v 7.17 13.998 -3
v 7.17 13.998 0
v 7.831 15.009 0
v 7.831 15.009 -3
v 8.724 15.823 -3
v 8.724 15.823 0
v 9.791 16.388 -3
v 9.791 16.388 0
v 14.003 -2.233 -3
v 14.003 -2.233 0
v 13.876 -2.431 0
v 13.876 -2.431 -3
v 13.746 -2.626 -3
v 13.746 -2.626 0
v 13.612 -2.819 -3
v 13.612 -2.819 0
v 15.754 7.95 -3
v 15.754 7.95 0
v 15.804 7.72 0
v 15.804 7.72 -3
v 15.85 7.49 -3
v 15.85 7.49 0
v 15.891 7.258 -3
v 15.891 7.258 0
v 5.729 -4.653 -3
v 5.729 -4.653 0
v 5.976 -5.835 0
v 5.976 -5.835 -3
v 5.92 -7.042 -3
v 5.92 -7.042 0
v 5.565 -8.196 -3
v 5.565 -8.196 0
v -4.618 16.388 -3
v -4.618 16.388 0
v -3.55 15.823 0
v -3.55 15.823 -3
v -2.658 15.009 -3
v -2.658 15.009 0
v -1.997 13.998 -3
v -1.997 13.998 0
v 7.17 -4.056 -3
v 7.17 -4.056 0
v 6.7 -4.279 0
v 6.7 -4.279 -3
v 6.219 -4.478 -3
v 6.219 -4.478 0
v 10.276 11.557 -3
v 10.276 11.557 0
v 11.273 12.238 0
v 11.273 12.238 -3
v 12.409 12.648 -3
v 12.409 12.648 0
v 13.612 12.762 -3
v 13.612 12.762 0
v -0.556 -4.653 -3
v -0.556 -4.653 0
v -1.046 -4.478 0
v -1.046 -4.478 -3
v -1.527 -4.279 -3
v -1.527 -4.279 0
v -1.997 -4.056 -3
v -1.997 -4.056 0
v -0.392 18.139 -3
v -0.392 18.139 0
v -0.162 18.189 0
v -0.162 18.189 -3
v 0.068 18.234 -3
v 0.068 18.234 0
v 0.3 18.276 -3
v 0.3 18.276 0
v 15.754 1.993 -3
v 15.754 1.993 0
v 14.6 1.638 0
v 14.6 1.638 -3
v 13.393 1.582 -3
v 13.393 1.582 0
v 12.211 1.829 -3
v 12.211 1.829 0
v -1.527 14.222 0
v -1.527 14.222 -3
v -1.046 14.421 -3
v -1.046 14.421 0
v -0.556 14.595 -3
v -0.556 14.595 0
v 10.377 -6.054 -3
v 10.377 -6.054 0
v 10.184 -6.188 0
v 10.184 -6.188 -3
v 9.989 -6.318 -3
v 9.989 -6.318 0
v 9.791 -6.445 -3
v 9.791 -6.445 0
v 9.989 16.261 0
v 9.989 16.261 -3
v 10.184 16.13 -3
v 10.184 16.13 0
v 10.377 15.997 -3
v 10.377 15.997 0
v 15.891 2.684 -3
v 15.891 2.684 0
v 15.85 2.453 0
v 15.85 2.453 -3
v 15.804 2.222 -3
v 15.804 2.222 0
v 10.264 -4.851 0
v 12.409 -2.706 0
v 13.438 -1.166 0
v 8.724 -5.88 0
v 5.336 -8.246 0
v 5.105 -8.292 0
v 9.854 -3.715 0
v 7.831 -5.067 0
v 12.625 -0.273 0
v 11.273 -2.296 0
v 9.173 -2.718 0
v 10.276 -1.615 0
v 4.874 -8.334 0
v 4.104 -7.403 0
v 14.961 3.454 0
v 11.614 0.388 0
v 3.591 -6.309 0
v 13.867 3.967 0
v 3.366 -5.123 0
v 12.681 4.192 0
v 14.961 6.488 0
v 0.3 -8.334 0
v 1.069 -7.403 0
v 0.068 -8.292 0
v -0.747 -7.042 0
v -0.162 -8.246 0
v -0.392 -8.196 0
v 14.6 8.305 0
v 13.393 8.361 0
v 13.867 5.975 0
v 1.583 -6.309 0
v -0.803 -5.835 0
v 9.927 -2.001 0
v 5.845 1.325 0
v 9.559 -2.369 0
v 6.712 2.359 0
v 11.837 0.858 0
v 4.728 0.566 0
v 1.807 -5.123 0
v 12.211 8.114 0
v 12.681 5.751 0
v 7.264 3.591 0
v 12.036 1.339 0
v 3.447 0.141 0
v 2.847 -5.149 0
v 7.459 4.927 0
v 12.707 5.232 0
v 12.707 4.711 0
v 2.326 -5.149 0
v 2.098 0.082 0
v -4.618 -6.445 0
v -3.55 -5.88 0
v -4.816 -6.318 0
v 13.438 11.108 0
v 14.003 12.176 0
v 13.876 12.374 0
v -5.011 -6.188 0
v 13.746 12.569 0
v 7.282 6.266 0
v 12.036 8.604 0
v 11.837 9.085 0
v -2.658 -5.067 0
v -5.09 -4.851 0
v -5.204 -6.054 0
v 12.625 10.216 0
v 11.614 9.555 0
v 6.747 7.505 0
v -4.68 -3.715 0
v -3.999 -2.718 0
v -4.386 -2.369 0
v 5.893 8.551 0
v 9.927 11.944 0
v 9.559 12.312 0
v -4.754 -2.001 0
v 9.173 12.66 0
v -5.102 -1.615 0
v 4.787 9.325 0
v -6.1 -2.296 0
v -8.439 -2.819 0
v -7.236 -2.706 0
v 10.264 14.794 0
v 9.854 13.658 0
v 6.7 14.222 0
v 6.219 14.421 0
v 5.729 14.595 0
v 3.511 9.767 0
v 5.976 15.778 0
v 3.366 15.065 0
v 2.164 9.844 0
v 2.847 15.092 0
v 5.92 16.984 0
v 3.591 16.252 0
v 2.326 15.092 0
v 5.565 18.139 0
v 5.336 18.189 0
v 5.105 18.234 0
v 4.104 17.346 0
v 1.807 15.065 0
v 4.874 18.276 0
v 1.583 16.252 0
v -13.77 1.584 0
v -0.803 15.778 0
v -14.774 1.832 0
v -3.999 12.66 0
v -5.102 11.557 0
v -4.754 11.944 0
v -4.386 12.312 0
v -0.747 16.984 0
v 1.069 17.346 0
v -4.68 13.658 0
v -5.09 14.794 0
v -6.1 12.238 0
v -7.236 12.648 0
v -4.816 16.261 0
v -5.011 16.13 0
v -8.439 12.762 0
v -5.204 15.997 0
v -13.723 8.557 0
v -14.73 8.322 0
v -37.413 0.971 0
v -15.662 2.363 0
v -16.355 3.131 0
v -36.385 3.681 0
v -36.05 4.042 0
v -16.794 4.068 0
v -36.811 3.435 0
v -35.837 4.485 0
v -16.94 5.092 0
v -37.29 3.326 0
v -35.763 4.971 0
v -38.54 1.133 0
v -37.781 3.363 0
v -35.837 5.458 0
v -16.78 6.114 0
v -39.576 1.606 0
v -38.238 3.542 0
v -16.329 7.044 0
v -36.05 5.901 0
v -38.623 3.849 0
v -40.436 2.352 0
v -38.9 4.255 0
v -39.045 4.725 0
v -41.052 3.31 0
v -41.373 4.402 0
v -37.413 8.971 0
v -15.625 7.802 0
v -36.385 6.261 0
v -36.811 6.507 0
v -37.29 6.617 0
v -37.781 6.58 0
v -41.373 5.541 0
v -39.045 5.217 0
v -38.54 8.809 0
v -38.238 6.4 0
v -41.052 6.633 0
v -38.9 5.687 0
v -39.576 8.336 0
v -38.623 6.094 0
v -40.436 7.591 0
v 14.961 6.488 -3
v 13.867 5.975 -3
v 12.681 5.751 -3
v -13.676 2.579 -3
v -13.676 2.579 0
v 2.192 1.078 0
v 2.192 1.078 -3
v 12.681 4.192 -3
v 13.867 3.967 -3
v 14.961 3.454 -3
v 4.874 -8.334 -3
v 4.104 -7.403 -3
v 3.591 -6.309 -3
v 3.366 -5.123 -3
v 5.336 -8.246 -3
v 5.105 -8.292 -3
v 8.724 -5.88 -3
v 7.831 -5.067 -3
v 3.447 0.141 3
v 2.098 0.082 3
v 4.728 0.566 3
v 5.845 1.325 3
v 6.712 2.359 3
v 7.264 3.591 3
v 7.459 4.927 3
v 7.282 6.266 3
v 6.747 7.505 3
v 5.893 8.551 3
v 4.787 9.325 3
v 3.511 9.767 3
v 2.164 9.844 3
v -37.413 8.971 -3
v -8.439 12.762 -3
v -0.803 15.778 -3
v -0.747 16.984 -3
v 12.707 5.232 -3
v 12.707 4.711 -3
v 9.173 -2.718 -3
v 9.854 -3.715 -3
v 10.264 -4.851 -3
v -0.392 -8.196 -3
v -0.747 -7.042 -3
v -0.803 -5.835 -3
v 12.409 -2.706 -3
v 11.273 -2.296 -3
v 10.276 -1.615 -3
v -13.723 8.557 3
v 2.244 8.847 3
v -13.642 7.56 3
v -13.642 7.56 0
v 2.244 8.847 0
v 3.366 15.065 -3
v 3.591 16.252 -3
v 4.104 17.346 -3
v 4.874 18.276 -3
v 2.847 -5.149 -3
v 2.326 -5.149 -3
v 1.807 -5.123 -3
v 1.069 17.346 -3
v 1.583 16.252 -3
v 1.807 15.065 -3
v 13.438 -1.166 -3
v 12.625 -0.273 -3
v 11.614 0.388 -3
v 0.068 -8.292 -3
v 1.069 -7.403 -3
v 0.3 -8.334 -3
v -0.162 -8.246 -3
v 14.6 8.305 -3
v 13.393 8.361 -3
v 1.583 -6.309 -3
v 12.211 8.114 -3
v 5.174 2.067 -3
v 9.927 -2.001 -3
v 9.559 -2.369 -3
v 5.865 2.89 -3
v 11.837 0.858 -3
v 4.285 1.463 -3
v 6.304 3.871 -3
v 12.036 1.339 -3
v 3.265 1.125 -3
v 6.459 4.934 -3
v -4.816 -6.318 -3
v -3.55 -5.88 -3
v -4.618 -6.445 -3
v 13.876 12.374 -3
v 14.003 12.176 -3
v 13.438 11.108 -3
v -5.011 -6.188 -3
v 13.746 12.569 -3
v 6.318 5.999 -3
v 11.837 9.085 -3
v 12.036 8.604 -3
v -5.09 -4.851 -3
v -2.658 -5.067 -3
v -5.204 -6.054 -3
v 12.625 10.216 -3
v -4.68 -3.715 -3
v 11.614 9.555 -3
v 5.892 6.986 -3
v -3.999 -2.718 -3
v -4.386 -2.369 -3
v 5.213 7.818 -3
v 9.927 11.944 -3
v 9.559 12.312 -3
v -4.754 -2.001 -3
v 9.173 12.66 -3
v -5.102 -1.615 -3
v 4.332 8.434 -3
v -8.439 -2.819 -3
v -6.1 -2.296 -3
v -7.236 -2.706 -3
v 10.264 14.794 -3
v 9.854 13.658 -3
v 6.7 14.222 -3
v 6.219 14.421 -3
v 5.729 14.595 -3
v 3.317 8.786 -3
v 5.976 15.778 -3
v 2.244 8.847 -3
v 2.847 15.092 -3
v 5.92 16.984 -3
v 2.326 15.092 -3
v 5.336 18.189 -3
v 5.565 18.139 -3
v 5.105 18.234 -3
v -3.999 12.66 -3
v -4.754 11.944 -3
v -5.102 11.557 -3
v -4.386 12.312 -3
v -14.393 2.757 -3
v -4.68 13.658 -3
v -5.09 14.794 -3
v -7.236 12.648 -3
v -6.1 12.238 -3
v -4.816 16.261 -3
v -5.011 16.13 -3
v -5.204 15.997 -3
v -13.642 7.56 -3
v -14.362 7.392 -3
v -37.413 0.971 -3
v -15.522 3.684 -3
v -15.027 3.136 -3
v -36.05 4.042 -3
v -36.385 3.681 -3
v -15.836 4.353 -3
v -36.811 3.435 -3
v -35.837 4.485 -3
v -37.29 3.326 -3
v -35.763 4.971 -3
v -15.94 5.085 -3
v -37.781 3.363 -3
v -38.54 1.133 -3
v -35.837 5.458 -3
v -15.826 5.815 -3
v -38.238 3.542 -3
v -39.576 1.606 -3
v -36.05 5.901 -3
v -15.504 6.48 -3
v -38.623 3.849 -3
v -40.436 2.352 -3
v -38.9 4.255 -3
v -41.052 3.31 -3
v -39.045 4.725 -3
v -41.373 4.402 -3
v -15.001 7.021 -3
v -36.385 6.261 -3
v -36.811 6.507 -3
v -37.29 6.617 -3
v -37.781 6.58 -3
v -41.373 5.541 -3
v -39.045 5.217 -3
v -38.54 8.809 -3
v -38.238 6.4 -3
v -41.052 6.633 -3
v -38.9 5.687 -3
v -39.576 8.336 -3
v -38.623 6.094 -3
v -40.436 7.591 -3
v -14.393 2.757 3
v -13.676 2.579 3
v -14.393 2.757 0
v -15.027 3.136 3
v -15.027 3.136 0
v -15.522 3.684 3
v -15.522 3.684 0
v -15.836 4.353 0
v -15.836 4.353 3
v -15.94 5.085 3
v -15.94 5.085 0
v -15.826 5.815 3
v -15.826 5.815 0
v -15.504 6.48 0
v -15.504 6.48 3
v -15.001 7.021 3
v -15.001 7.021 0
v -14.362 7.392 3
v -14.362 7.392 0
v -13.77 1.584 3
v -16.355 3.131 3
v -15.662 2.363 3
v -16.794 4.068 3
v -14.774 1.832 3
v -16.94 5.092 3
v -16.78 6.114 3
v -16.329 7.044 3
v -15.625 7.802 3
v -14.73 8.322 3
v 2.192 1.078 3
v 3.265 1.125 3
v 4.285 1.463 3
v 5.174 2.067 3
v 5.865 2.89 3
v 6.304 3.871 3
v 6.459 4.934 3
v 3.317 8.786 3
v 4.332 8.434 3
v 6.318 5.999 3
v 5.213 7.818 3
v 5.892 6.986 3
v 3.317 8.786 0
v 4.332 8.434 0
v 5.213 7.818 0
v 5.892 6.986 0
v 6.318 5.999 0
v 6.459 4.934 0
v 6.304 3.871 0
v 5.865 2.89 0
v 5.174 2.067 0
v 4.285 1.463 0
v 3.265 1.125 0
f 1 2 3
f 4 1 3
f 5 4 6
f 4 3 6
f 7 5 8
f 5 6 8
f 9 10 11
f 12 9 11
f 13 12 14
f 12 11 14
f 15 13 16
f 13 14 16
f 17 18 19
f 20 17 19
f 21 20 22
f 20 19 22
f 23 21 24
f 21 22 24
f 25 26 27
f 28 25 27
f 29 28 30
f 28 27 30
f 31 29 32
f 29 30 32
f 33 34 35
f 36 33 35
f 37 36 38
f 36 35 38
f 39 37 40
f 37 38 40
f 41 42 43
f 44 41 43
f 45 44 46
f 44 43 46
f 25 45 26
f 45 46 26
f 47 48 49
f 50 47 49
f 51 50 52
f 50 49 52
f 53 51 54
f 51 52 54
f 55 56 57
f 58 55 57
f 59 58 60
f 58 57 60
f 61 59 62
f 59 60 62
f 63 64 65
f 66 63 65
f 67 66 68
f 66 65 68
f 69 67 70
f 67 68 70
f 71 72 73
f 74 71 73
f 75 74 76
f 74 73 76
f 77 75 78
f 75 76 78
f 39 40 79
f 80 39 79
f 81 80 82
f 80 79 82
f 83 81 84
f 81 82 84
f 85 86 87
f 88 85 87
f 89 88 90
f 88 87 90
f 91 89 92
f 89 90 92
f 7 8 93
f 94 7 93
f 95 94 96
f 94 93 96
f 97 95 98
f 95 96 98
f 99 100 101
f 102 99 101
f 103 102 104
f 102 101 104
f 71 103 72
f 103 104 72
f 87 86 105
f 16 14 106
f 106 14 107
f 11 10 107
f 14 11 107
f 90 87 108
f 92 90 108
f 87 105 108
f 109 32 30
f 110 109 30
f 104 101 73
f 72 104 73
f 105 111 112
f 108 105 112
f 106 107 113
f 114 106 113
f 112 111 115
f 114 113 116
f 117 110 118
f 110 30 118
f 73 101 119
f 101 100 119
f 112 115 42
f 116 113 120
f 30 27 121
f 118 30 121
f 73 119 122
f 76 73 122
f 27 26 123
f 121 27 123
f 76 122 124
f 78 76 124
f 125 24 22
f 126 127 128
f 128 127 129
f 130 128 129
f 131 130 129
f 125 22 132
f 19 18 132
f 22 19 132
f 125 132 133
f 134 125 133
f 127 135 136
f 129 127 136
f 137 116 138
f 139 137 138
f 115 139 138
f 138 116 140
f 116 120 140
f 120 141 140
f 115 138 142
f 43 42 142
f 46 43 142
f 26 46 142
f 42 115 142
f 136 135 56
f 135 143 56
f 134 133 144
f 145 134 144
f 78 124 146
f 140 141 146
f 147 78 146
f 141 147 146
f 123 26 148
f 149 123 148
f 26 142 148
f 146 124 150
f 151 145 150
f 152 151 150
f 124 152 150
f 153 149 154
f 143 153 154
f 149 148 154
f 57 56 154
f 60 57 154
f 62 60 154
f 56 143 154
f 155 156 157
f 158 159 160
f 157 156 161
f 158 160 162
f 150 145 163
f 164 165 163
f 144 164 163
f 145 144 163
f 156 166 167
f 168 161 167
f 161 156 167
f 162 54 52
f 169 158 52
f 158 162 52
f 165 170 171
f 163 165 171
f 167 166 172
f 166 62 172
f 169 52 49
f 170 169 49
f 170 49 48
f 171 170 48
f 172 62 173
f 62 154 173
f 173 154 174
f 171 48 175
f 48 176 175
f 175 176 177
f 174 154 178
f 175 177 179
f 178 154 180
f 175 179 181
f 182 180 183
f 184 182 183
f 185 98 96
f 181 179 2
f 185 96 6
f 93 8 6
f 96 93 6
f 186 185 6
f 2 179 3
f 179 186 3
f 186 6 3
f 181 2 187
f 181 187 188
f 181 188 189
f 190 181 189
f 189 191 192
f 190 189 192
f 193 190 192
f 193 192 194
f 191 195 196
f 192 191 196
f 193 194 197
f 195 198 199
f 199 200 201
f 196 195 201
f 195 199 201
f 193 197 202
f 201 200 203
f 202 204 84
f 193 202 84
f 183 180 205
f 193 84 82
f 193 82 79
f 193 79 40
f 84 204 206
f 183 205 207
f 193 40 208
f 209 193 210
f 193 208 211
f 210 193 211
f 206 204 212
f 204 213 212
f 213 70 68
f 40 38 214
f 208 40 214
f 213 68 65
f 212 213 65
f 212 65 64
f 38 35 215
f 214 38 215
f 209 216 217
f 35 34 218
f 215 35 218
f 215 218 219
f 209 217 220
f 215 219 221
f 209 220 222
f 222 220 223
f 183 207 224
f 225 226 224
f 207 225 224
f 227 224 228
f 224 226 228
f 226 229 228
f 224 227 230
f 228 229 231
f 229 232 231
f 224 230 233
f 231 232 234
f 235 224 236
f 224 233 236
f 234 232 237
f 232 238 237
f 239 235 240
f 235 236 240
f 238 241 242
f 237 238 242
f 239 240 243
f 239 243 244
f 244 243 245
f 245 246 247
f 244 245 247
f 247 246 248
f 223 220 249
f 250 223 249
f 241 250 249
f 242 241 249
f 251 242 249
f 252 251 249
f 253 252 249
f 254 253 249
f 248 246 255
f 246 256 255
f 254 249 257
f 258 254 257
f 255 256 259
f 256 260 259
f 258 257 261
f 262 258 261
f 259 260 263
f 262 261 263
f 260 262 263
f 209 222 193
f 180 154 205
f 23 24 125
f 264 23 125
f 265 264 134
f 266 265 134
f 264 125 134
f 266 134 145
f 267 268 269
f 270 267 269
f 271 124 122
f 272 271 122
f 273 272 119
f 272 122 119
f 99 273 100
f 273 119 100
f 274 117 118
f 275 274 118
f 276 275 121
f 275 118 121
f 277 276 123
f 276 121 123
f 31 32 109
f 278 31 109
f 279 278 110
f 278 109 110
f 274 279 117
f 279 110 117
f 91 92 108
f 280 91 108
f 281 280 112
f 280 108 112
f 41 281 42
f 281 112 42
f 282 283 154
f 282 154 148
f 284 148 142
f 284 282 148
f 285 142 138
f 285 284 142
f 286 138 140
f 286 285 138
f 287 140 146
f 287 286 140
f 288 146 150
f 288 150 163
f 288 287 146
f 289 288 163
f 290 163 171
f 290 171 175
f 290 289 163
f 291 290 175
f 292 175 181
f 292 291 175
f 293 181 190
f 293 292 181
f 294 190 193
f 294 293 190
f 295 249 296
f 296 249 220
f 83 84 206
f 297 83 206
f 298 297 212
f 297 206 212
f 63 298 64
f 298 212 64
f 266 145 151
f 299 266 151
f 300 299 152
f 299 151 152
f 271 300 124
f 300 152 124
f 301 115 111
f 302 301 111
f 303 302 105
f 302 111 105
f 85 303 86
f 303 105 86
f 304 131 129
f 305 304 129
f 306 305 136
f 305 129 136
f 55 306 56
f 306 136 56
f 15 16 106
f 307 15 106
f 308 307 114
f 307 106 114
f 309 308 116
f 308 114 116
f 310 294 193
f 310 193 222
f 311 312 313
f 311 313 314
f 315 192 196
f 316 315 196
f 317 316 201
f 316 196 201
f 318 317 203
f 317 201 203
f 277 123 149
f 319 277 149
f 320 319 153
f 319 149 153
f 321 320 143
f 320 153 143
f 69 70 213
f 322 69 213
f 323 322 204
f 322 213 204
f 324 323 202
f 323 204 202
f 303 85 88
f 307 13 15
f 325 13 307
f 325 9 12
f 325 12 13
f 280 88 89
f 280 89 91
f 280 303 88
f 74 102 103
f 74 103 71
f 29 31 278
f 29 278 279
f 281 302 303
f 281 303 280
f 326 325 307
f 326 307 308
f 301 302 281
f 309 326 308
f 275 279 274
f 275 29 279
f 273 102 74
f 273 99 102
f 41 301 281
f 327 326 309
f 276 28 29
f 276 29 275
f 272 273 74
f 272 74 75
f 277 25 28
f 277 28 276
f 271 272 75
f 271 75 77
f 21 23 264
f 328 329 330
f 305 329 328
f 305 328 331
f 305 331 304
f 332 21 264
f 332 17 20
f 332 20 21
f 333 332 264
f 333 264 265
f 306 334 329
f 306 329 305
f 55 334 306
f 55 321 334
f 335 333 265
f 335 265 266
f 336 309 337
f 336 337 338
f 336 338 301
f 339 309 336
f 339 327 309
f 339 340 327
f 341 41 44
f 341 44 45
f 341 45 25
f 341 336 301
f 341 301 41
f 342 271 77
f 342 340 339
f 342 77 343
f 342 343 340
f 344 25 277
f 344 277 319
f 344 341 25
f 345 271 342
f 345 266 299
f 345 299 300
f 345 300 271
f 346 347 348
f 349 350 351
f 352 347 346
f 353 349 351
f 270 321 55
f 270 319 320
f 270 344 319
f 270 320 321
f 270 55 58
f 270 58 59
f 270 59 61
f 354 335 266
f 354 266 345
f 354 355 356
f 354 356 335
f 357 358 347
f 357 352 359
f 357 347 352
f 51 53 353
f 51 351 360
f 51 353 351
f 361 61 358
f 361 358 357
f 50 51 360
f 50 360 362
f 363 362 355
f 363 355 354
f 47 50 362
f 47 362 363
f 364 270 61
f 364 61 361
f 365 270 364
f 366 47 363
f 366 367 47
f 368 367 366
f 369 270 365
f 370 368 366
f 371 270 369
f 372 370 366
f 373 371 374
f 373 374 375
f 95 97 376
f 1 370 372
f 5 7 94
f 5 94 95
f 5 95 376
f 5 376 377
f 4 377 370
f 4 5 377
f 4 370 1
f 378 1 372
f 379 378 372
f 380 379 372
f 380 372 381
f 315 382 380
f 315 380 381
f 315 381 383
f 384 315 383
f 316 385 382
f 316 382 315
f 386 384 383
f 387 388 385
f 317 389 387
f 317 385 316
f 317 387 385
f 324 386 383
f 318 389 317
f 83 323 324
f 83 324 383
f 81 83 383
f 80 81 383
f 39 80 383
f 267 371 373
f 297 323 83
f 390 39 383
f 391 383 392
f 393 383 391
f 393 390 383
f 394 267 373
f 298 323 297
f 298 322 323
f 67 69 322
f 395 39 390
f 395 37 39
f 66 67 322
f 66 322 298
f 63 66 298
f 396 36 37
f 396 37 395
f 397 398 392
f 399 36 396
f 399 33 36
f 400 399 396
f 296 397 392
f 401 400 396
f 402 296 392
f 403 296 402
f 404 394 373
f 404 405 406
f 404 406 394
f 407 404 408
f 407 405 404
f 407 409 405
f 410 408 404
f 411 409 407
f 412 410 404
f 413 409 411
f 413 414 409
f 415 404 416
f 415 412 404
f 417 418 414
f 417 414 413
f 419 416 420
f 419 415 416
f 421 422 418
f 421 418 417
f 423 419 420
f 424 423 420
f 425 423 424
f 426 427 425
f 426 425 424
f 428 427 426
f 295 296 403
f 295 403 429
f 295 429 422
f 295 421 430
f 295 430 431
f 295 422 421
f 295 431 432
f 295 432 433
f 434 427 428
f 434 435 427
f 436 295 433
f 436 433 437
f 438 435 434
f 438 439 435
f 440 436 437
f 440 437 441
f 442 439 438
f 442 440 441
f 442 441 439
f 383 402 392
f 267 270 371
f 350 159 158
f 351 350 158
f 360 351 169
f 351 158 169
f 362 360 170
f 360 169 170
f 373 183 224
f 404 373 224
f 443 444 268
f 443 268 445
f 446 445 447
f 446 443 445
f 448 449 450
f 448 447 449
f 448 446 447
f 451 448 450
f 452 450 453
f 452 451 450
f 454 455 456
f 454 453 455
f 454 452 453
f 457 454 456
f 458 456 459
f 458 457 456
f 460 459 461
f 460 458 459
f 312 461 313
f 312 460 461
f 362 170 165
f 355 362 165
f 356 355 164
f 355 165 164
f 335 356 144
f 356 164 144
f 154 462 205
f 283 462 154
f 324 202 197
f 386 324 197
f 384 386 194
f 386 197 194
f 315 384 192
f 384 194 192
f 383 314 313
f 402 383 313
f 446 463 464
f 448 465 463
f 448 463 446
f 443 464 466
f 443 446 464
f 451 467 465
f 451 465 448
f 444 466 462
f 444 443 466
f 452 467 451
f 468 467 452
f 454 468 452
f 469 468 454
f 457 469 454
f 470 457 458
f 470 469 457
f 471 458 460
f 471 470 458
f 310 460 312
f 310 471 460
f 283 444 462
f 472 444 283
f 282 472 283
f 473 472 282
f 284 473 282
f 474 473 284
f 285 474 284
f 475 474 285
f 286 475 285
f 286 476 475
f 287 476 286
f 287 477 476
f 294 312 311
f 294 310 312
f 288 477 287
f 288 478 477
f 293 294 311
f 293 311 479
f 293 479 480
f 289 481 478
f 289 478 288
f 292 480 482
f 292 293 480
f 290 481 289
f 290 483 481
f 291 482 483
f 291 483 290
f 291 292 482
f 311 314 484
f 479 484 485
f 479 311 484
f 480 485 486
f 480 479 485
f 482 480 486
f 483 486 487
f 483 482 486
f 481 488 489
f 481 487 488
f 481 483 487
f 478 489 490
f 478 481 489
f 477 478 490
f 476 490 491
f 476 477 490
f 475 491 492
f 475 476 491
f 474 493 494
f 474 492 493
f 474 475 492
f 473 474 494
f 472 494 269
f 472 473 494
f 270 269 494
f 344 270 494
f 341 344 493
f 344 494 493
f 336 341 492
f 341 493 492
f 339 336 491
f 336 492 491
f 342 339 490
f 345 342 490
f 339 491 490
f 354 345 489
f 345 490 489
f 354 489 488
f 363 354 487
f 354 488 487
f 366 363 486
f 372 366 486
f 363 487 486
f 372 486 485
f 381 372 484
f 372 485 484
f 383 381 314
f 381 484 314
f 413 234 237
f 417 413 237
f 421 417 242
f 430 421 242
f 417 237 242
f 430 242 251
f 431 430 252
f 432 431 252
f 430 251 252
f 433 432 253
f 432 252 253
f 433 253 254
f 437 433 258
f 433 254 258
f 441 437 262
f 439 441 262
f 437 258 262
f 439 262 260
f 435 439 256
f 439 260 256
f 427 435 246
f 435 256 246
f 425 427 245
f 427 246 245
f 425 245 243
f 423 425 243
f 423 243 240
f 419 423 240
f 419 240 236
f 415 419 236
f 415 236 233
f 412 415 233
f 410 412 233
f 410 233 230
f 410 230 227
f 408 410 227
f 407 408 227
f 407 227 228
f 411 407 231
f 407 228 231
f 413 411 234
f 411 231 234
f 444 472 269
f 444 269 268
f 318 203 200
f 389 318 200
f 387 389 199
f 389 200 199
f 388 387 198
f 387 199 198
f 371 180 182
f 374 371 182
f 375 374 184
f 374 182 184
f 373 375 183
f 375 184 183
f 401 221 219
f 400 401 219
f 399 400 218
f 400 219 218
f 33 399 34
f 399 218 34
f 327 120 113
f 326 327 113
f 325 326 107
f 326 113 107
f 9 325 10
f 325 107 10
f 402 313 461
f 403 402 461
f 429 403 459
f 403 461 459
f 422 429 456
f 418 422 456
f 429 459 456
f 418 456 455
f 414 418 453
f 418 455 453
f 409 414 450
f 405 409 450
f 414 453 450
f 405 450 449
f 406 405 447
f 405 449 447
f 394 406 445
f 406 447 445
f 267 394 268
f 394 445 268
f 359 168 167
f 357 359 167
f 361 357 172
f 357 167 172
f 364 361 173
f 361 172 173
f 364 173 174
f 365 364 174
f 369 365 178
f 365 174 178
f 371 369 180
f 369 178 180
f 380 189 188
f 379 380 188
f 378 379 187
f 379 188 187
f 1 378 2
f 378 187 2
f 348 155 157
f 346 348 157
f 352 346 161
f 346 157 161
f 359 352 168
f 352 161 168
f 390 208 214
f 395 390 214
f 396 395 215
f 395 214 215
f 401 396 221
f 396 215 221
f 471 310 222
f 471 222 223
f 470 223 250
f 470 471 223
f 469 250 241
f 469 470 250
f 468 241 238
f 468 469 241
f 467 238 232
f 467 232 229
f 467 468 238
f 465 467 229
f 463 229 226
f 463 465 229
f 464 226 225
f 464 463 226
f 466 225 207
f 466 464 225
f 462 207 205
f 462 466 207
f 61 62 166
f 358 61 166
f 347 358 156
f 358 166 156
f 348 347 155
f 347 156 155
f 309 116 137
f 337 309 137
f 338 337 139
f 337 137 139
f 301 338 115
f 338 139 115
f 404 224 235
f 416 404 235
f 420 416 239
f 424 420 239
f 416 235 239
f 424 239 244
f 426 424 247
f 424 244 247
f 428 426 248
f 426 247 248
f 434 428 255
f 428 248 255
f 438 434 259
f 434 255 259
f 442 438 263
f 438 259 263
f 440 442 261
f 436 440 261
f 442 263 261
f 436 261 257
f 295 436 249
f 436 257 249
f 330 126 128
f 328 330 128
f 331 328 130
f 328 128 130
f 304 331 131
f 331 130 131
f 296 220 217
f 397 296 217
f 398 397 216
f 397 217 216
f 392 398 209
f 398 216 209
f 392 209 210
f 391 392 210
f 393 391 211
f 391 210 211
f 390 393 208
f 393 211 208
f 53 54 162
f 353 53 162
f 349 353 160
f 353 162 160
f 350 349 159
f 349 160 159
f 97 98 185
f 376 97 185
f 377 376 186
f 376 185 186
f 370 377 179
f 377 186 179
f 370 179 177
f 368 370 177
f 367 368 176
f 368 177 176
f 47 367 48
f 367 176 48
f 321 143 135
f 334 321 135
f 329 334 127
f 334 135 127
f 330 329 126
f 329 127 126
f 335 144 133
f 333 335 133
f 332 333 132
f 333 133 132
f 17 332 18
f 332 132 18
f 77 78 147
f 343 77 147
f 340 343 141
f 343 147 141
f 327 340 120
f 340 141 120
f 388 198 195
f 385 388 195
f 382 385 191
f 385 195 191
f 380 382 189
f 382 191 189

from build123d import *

# Parameters (mm, degrees)
SKETCH1_R           = 1.65
BOSS_EXTRUDE1_DEPTH = 3
BOSS_EXTRUDE2_START = 3
BOSS_EXTRUDE2_DEPTH = 3


with BuildPart() as part:
    # Sketch1 → Boss-Extrude1 (new body)
    with BuildSketch(Plane.XY):
        with BuildLine():
            ThreePointArc((-5.102248015, 11.557418974), (-6.655042336, 12.47922503), (-8.43855136, 12.762053897))
            Line((-8.43855136, 12.762053897), (-37.413359367, 8.97134523))
            ThreePointArc((-37.413359367, 8.97134523), (-41.413359367, 4.97134523), (-37.413359367, 0.97134523))
            Line((-37.413359367, 0.97134523), (-8.43855136, -2.819363436))
            ThreePointArc((-8.43855136, -2.819363436), (-6.655042336, -2.53653457), (-5.102248015, -1.614728513))
            ThreePointArc((-5.102248015, -1.614728513), (-4.57210842, -2.187403822), (-3.999433111, -2.717543418))
            ThreePointArc((-3.999433111, -2.717543418), (-4.921239167, -4.270337738), (-5.204068034, -6.053846762))
            ThreePointArc((-5.204068034, -6.053846762), (-4.913557513, -6.253494536), (-4.617933458, -6.445489365))
            ThreePointArc((-4.617933458, -6.445489365), (-3.078419896, -5.501670209), (-1.996584911, -4.0558038))
            ThreePointArc((-1.996584911, -4.0558038), (-1.287646436, -4.382011157), (-0.5556878, -4.652642925))
            ThreePointArc((-0.5556878, -4.652642925), (-0.813096888, -6.439997722), (-0.391877334, -8.195979127))
            ThreePointArc((-0.391877334, -8.195979127), (-0.047078714, -8.269256055), (0.299515539, -8.33350572))
            ThreePointArc((0.299515539, -8.33350572), (1.360656655, -6.872384185), (1.806832736, -5.122577478))
            ThreePointArc((1.806832736, -5.122577478), (2.586640633, -5.15265477), (3.36644853, -5.122577478))
            ThreePointArc((3.36644853, -5.122577478), (3.81262461, -6.872384185), (4.873765726, -8.33350572))
            ThreePointArc((4.873765726, -8.33350572), (5.22035998, -8.269256055), (5.565158599, -8.195979127))
            ThreePointArc((5.565158599, -8.195979127), (5.986378153, -6.439997722), (5.728969065, -4.652642925))
            ThreePointArc((5.728969065, -4.652642925), (6.460927702, -4.382011157), (7.169866176, -4.0558038))
            ThreePointArc((7.169866176, -4.0558038), (8.251701162, -5.501670209), (9.791214724, -6.445489365))
            ThreePointArc((9.791214724, -6.445489365), (10.086838779, -6.253494536), (10.377349299, -6.053846762))
            ThreePointArc((10.377349299, -6.053846762), (10.094520433, -4.270337738), (9.172714377, -2.717543418))
            ThreePointArc((9.172714377, -2.717543418), (9.745389686, -2.187403822), (10.275529281, -1.614728513))
            ThreePointArc((10.275529281, -1.614728513), (11.828323601, -2.53653457), (13.611832625, -2.819363436))
            ThreePointArc((13.611832625, -2.819363436), (13.811480399, -2.528852915), (14.003475228, -2.233228861))
            ThreePointArc((14.003475228, -2.233228861), (13.059656072, -0.693715298), (11.613789663, 0.388119687))
            ThreePointArc((11.613789663, 0.388119687), (11.93999702, 1.097058161), (12.210628788, 1.829016798))
            ThreePointArc((12.210628788, 1.829016798), (13.997983585, 1.57160771), (15.75396499, 1.992827264))
            ThreePointArc((15.75396499, 1.992827264), (15.827241918, 2.337625883), (15.891491583, 2.684220137))
            ThreePointArc((15.891491583, 2.684220137), (14.430370048, 3.745361253), (12.680563341, 4.191537333))
            ThreePointArc((12.680563341, 4.191537333), (12.710640633, 4.97134523), (12.680563341, 5.751153127))
            ThreePointArc((12.680563341, 5.751153127), (14.430370048, 6.197329208), (15.891491583, 7.258470324))
            ThreePointArc((15.891491583, 7.258470324), (15.827241918, 7.605064578), (15.75396499, 7.949863197))
            ThreePointArc((15.75396499, 7.949863197), (13.997983585, 8.371082751), (12.210628788, 8.113673663))
            ThreePointArc((12.210628788, 8.113673663), (11.93999702, 8.8456323), (11.613789663, 9.554570774))
            ThreePointArc((11.613789663, 9.554570774), (13.059656072, 10.636405759), (14.003475228, 12.175919321))
            ThreePointArc((14.003475228, 12.175919321), (13.811480399, 12.471543376), (13.611832625, 12.762053897))
            ThreePointArc((13.611832625, 12.762053897), (11.828323601, 12.47922503), (10.275529281, 11.557418974))
            ThreePointArc((10.275529281, 11.557418974), (9.745389686, 12.130094283), (9.172714377, 12.660233878))
            ThreePointArc((9.172714377, 12.660233878), (10.094520433, 14.213028199), (10.377349299, 15.996537223))
            ThreePointArc((10.377349299, 15.996537223), (10.086838779, 16.196184996), (9.791214724, 16.388179825))
            ThreePointArc((9.791214724, 16.388179825), (8.251701162, 15.444360669), (7.169866176, 13.998494261))
            ThreePointArc((7.169866176, 13.998494261), (6.460927702, 14.324701618), (5.728969065, 14.595333386))
            ThreePointArc((5.728969065, 14.595333386), (5.986378153, 16.382688183), (5.565158599, 18.138669587))
            ThreePointArc((5.565158599, 18.138669587), (5.22035998, 18.211946516), (4.873765726, 18.276196181))
            ThreePointArc((4.873765726, 18.276196181), (3.81262461, 16.815074646), (3.36644853, 15.065267939))
            ThreePointArc((3.36644853, 15.065267939), (2.586640633, 15.09534523), (1.806832736, 15.065267939))
            ThreePointArc((1.806832736, 15.065267939), (1.360656655, 16.815074646), (0.299515539, 18.276196181))
            ThreePointArc((0.299515539, 18.276196181), (-0.047078714, 18.211946516), (-0.391877334, 18.138669587))
            ThreePointArc((-0.391877334, 18.138669587), (-0.813096888, 16.382688183), (-0.5556878, 14.595333386))
            ThreePointArc((-0.5556878, 14.595333386), (-1.287646436, 14.324701618), (-1.996584911, 13.998494261))
            ThreePointArc((-1.996584911, 13.998494261), (-3.078419896, 15.444360669), (-4.617933458, 16.388179825))
            ThreePointArc((-4.617933458, 16.388179825), (-4.913557513, 16.196184996), (-5.204068034, 15.996537223))
            ThreePointArc((-5.204068034, 15.996537223), (-4.921239167, 14.213028199), (-3.999433111, 12.660233878))
            ThreePointArc((-3.999433111, 12.660233878), (-4.57210842, 12.130094283), (-5.102248015, 11.557418974))
        make_face()
        with BuildLine():
            ThreePointArc((2.244369697, 8.847463799), (6.459336179, 4.933922237), (2.191995363, 1.077557063))
            Line((2.191995363, 1.077557063), (-13.675743419, 2.579178177))
            ThreePointArc((-13.675743419, 2.579178177), (-15.940154949, 5.084909691), (-13.642170127, 7.559887623))
            Line((-13.642170127, 7.559887623), (2.244369697, 8.847463799))
        make_face(mode=Mode.SUBTRACT)
        with Locations((-37.413359367, 4.97134523)):
            Circle(SKETCH1_R, mode=Mode.SUBTRACT)
    extrude(amount=-BOSS_EXTRUDE1_DEPTH)

    # Sketch1<3> → Boss-Extrude2 (add)
    with BuildSketch(Plane.XY.offset(BOSS_EXTRUDE2_START)):
        with BuildLine():
            Line((2.163586343, 9.844195483), (-13.722953481, 8.556619307))
            ThreePointArc((-13.722953481, 8.556619307), (-16.940132231, 5.091650203), (-13.769956089, 1.583626083))
            Line((-13.769956089, 1.583626083), (2.097782692, 0.082004969))
            ThreePointArc((2.097782692, 0.082004969), (7.459313462, 4.927181726), (2.163586343, 9.844195483))
        make_face()
        with BuildLine():
            ThreePointArc((2.244369697, 8.847463799), (6.459336179, 4.933922237), (2.191995363, 1.077557063))
            Line((2.191995363, 1.077557063), (-13.675743419, 2.579178177))
            ThreePointArc((-13.675743419, 2.579178177), (-15.940154949, 5.084909691), (-13.642170127, 7.559887623))
            Line((-13.642170127, 7.559887623), (2.244369697, 8.847463799))
        make_face(mode=Mode.SUBTRACT)
    extrude(amount=-BOSS_EXTRUDE2_DEPTH)


solid = part.part
